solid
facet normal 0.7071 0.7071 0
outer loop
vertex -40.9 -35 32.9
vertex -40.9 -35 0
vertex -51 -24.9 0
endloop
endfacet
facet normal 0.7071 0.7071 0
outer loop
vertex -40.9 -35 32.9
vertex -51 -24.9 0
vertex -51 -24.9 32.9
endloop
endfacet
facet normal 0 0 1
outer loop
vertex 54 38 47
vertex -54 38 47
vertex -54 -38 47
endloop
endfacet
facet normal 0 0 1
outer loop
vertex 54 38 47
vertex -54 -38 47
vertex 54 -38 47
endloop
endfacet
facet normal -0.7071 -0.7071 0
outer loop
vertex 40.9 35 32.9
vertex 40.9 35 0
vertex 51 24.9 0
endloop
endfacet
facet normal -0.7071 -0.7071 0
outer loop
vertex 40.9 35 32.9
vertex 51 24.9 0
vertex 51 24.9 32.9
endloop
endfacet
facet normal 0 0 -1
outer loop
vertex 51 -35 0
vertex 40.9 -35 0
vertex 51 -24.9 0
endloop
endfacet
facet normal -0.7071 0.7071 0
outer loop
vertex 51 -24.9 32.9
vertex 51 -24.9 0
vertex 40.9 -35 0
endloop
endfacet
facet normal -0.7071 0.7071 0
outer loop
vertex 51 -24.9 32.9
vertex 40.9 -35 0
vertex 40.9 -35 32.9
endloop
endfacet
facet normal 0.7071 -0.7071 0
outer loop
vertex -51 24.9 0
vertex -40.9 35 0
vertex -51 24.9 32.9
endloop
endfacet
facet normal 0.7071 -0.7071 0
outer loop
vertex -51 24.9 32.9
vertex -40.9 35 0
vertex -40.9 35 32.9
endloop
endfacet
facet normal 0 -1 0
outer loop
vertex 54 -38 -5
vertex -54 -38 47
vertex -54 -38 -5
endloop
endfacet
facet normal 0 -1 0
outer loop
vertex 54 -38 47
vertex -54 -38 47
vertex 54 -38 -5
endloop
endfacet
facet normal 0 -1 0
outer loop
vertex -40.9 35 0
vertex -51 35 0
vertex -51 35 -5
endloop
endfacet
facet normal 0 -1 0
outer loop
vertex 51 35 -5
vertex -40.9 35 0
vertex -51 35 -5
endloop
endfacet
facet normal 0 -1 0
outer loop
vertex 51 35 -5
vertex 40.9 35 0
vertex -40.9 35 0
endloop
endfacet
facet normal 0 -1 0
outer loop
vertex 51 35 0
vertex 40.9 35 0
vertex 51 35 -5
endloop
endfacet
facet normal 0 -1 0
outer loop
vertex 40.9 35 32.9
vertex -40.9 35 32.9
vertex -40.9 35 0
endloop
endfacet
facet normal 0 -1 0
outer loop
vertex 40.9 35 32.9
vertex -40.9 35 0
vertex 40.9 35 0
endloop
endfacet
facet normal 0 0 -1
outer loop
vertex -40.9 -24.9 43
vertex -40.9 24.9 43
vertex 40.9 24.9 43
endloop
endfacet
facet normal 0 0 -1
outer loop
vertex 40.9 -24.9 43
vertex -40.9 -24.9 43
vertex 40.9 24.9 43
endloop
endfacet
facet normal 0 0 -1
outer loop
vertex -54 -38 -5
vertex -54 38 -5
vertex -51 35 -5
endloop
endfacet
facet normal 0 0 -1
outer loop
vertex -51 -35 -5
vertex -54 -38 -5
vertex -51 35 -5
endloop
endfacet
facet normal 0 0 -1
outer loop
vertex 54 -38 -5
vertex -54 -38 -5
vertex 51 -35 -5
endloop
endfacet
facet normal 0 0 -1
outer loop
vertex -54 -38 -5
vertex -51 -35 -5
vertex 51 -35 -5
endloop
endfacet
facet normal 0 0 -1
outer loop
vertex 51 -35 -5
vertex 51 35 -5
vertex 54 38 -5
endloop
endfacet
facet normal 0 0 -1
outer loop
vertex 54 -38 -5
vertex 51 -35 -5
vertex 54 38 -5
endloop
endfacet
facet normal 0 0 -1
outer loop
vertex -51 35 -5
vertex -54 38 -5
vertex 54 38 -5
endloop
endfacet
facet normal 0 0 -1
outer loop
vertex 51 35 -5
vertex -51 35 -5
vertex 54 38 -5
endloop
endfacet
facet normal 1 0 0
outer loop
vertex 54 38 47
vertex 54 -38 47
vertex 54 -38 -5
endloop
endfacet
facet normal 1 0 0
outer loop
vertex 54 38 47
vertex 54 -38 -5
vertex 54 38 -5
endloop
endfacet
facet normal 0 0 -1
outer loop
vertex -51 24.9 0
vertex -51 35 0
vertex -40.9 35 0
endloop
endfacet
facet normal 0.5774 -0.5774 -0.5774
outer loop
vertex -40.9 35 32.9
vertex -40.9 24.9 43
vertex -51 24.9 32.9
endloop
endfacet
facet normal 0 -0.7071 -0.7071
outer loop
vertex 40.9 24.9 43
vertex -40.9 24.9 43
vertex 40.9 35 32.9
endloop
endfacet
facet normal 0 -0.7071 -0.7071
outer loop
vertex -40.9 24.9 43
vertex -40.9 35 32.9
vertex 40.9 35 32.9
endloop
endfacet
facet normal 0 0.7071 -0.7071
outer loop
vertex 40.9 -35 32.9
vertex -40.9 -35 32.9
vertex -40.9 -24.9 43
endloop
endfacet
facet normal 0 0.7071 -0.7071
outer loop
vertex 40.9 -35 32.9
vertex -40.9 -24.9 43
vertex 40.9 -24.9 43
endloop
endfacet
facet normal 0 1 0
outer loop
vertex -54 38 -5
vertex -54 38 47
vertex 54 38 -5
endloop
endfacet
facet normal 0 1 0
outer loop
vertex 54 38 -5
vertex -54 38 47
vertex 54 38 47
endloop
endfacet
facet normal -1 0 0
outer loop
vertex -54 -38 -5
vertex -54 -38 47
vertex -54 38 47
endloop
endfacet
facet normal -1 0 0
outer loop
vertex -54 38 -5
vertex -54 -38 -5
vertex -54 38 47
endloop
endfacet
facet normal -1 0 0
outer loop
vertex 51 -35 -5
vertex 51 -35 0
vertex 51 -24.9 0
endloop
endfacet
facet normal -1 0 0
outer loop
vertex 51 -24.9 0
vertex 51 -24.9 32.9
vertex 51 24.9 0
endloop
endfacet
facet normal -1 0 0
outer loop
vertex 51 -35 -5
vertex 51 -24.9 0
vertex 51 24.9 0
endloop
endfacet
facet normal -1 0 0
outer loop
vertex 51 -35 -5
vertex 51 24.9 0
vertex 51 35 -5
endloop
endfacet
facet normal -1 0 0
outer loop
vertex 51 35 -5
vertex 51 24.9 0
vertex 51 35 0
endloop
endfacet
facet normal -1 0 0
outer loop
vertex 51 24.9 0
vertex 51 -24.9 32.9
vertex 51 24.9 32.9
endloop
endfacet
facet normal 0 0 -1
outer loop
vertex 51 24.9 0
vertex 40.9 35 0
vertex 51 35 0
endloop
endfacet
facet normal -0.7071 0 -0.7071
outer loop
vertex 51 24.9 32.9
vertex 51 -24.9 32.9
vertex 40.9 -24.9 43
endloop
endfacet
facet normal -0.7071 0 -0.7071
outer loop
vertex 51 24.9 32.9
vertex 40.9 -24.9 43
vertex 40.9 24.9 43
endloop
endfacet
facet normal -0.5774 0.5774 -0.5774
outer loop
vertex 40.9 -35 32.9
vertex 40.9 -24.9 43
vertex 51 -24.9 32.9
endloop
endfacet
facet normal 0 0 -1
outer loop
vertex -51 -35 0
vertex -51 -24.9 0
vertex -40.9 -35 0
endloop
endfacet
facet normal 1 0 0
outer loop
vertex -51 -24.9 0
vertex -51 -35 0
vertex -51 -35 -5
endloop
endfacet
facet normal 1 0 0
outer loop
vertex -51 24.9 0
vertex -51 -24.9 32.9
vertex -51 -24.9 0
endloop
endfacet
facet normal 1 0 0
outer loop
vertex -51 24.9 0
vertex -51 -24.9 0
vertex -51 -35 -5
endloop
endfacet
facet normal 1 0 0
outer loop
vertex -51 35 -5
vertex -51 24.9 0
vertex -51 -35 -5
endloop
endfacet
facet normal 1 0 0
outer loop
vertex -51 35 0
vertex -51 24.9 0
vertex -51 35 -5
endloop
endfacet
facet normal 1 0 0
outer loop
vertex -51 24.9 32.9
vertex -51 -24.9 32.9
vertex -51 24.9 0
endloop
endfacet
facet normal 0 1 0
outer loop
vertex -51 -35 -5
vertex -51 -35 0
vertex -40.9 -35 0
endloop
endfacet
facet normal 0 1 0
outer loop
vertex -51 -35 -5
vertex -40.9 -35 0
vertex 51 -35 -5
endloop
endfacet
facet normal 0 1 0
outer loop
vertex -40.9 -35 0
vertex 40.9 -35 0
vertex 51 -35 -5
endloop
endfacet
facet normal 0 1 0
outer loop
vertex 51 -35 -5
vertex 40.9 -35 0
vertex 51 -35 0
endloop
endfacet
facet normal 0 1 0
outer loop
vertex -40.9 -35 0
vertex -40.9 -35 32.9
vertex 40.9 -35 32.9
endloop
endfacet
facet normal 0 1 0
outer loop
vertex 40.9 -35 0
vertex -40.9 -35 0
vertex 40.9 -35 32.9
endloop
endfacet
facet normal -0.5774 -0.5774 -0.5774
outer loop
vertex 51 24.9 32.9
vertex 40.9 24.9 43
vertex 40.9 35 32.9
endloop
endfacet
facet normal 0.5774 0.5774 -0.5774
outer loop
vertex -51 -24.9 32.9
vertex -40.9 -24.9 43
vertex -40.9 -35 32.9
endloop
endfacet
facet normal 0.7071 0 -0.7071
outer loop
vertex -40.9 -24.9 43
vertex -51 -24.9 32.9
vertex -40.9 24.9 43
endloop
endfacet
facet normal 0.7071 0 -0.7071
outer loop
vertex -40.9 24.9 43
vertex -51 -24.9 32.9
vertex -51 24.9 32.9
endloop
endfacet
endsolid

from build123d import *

# Parameters (mm, degrees)
F0_W     = 108
F0_H     = 76
F0_W_2   = 102
F0_H_2   = 70
F1_DEPTH = 47
F2_START = 43
F2_DEPTH = 4
F3_SIZE  = 10.1
F4_DEPTH = 5


with BuildPart() as f1:
    # F0 (on Top) → F1 (new body)
    with BuildSketch(Plane.XY):
        Rectangle(F0_W, F0_H)
        Rectangle(F0_W_2, F0_H_2, mode=Mode.SUBTRACT)
    extrude(amount=F1_DEPTH)

    # F0 (on Top) → F2 (join)
    with BuildSketch(Plane.XY.offset(F2_START)):
        Rectangle(F0_W_2, F0_H_2)
    extrude(amount=F2_DEPTH)

    # F3
    f3_edges = [f1.edges().sort_by_distance(p)[0] for p in [
        (0, 35, 43),
        (-51, 0, 43),
        (0, -35, 43),
        (51, 0, 43),
        (51, 35, 21.5),
        (-51, 35, 21.5),
        (-51, -35, 21.5),
        (51, -35, 21.5),
    ]]
    chamfer(f3_edges, length=F3_SIZE)

    # F0 (on Top) → F4 (join)
    with BuildSketch(Plane.XY):
        Rectangle(F0_W, F0_H)
        Rectangle(F0_W_2, F0_H_2, mode=Mode.SUBTRACT)
    extrude(amount=-F4_DEPTH)


solid = f1.part
